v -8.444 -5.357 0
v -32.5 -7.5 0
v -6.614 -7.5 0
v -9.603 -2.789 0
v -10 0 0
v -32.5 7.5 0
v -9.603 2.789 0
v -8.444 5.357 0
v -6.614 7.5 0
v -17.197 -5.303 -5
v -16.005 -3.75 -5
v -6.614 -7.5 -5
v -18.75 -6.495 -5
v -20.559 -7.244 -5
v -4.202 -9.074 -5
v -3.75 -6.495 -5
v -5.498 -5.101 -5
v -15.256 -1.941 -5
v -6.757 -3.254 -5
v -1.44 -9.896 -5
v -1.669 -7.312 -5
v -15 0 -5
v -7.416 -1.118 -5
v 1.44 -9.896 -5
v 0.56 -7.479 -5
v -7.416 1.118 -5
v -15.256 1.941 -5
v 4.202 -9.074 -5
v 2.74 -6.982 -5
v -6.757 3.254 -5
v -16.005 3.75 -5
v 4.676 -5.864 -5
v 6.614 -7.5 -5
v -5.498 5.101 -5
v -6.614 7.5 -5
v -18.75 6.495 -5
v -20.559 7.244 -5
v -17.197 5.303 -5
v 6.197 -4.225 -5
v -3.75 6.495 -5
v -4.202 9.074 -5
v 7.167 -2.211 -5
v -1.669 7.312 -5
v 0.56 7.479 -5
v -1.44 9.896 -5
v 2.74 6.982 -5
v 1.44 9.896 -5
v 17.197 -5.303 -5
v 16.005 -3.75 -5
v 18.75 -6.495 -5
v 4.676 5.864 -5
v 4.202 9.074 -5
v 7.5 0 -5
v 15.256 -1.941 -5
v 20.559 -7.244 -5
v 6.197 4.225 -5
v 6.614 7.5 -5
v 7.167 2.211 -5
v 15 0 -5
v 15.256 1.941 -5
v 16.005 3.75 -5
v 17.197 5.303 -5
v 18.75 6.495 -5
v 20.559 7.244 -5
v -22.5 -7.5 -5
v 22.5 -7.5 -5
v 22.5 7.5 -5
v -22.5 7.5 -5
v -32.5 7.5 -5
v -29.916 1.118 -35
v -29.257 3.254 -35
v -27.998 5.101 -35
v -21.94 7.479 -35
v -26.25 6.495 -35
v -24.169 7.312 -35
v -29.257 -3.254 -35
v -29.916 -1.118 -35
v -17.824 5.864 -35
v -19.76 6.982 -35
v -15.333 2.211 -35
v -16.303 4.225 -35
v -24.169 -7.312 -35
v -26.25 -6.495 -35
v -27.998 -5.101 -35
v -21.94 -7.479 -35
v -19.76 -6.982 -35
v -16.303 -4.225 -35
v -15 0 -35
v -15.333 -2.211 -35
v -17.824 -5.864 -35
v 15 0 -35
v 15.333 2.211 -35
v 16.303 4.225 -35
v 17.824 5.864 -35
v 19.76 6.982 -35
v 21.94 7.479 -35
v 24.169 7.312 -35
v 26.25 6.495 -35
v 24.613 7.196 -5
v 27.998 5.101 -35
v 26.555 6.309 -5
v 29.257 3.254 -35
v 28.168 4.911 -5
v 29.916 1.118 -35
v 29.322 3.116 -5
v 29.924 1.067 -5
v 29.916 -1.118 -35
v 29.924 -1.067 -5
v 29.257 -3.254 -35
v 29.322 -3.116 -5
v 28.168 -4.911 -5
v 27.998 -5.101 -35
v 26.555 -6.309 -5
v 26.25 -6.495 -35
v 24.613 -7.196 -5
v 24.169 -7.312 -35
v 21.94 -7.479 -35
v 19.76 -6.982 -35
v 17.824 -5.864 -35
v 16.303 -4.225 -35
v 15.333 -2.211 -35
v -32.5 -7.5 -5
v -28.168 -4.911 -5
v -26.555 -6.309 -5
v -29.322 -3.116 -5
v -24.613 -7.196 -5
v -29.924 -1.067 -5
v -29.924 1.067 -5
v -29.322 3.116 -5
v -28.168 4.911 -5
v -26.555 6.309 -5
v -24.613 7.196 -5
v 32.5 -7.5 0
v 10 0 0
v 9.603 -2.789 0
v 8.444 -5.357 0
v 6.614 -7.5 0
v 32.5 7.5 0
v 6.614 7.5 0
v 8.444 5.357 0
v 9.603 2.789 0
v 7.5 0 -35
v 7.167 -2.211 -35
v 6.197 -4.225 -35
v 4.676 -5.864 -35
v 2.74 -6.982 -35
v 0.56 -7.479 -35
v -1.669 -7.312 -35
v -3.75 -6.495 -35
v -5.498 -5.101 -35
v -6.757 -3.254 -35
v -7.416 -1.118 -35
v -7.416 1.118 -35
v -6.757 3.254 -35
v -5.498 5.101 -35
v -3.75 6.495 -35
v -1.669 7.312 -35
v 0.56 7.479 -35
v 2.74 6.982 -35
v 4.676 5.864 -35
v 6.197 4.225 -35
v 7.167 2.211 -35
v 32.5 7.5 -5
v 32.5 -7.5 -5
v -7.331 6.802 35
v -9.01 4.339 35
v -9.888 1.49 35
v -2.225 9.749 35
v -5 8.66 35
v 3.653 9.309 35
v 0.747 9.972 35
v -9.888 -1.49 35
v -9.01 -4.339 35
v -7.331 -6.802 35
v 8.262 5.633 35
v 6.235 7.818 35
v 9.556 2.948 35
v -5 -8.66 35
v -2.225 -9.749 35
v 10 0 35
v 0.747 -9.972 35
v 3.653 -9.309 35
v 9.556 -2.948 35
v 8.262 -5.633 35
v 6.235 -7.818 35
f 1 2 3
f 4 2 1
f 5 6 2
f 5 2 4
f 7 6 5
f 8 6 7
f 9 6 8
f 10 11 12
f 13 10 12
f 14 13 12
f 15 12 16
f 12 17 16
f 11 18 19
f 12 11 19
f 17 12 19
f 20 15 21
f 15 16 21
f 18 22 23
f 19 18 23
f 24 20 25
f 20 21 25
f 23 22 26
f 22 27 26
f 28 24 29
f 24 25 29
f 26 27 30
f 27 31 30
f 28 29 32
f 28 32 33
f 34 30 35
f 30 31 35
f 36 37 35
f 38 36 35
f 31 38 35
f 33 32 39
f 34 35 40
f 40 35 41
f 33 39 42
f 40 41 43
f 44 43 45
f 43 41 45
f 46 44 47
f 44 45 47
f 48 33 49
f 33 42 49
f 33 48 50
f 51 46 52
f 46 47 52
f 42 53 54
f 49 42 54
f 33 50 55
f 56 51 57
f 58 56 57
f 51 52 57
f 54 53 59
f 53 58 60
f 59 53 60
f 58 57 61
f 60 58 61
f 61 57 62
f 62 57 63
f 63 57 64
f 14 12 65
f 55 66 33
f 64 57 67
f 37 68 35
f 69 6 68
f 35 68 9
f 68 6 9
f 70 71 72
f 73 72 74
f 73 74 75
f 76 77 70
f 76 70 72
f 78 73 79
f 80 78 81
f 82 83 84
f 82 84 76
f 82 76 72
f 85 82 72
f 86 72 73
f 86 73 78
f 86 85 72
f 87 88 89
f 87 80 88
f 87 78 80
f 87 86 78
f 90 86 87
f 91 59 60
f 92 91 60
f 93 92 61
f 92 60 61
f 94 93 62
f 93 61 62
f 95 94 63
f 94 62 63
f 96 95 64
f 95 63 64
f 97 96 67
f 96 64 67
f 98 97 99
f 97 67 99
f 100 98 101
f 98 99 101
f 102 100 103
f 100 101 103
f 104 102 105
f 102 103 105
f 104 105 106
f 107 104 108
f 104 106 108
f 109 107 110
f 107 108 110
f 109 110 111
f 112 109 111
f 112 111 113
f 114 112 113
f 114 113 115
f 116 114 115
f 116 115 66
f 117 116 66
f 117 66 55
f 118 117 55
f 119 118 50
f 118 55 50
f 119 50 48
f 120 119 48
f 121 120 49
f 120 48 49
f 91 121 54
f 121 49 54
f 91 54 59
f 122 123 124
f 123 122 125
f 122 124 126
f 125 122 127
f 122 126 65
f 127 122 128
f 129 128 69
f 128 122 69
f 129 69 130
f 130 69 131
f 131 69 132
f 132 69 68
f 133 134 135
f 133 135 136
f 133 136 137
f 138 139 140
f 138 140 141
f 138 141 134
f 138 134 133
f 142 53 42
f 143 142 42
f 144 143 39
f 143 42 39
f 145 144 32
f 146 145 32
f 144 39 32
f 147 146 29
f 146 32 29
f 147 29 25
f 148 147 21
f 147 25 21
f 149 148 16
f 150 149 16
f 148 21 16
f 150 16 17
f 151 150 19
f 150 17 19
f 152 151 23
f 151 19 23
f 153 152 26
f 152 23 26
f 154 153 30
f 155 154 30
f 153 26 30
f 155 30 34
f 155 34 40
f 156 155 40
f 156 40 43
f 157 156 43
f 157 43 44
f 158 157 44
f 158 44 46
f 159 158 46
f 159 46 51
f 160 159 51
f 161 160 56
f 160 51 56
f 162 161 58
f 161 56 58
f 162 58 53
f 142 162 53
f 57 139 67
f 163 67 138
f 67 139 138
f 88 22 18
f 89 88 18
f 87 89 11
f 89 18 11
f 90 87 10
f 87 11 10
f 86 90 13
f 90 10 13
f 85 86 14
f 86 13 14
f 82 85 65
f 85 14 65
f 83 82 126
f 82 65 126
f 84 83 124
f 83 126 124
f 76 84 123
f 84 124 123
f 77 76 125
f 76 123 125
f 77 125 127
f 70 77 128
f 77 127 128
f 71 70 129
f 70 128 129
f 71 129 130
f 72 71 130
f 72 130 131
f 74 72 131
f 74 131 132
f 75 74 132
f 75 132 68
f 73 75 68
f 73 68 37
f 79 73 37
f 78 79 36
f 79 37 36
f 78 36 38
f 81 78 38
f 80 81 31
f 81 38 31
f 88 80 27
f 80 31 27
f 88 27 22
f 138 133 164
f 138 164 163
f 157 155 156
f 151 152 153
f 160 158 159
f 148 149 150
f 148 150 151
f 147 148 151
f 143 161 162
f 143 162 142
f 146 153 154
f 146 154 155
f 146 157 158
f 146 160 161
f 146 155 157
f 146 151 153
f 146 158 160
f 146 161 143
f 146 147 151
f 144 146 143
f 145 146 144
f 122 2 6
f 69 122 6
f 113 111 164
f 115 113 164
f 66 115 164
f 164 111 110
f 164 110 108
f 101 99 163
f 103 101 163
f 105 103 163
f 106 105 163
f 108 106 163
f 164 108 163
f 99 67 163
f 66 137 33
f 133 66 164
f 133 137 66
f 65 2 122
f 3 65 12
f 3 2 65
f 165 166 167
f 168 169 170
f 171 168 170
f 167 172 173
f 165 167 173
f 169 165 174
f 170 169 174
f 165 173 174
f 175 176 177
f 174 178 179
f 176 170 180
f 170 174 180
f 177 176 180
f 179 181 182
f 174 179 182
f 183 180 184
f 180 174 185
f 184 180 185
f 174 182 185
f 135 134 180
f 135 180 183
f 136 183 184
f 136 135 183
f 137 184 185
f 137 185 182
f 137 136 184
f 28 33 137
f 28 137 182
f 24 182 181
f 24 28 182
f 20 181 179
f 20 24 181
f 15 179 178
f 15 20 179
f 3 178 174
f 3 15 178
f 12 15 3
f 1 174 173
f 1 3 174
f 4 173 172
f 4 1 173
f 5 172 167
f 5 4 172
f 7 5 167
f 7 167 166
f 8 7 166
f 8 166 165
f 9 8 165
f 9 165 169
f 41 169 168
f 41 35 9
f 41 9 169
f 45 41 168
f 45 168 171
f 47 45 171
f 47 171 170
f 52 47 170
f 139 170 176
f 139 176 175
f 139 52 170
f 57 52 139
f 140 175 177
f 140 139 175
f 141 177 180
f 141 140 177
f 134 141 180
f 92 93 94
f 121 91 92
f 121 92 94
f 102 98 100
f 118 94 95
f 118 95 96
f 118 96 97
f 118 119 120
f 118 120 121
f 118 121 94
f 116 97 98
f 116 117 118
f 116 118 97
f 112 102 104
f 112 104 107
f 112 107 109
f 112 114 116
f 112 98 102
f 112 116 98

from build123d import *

# Parameters (mm, degrees)
F0_W     = 65
F0_H     = 15
F1_DEPTH = 5
F2_R     = 10
F3_DEPTH = 40
F4_R     = 7.5
F5_DEPTH = 30


with BuildPart() as f1:
    # F0 (on Top) → F1 (new body)
    with BuildSketch(Plane.XY):
        Rectangle(F0_W, F0_H)
    extrude(amount=-F1_DEPTH)

    # F2 (on face) → F3 (join)
    with BuildSketch(Plane(origin=(0, 0, -5), x_dir=(1, 0, 0), z_dir=(0, 0, -1))):
        Circle(F2_R)
    extrude(amount=-F3_DEPTH)

    # F4 (on face) → F5 (join)
    with BuildSketch(Plane(origin=(0, 0, -5), x_dir=(1, 0, 0), z_dir=(0, 0, -1))):
        with BuildLine():
            ThreePointArc((-7.5, 0), (0, -7.5), (7.5, 0))
            ThreePointArc((7.5, 0), (0, 7.5), (-7.5, 0))
        make_face()
        with Locations((-22.5, 0)):
            Circle(F4_R)
        with BuildLine():
            ThreePointArc((30, 0), (22.5, 7.5), (15, 0))
            ThreePointArc((15, 0), (22.5, -7.5), (30, 0))
        make_face()
    extrude(amount=F5_DEPTH)


solid = f1.part
